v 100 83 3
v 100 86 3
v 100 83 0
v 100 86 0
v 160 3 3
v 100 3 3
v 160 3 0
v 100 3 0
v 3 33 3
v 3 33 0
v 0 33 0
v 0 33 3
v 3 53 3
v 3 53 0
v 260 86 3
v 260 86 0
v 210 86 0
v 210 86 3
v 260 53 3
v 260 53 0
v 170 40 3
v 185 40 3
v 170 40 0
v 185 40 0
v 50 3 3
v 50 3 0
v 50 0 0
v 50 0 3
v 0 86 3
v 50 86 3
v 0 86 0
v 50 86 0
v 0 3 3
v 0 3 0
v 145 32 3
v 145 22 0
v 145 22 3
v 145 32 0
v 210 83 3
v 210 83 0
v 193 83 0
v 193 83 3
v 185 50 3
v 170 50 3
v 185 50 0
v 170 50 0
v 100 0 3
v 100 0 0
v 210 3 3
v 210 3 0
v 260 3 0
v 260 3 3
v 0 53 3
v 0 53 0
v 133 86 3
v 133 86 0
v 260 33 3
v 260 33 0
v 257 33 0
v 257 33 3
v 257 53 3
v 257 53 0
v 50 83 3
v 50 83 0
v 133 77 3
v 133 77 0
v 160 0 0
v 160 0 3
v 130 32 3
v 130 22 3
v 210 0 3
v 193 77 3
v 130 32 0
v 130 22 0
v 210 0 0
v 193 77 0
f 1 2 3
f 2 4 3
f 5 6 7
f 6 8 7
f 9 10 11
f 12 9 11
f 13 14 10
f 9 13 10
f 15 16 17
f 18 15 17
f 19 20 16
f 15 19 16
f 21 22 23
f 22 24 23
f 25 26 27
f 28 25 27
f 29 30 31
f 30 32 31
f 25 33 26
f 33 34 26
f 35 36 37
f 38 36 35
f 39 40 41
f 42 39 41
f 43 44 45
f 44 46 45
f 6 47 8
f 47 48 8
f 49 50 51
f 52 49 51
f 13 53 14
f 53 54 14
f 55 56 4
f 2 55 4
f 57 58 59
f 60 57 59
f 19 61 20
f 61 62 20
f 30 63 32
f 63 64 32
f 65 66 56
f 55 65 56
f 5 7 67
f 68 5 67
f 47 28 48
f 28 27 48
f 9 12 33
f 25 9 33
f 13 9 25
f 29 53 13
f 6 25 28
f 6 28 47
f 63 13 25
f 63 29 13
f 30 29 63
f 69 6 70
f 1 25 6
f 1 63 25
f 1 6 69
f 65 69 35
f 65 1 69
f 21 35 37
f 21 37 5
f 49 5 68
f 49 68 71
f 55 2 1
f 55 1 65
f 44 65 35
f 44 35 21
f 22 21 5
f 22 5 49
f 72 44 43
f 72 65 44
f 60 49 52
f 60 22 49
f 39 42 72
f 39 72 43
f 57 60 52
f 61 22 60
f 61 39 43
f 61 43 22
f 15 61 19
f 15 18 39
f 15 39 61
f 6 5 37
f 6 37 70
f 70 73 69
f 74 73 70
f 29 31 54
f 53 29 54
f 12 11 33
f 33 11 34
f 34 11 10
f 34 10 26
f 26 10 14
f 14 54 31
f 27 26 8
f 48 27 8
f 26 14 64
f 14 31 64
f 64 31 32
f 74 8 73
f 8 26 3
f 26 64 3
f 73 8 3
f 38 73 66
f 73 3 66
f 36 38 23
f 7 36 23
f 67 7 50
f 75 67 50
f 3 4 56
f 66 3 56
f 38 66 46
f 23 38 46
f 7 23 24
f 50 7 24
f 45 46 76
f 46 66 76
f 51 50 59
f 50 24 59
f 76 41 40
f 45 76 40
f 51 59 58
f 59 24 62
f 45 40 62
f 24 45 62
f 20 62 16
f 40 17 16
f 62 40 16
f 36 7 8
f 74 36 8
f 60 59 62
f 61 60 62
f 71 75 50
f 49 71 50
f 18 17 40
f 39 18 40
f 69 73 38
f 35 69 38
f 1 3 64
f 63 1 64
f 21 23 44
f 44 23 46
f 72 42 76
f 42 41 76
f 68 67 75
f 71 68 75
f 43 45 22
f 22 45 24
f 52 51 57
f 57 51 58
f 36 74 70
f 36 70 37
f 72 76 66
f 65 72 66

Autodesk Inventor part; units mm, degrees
ref_plane "YZ Plane" through (0, 0, 0) normal (1, 0, 0) x (0, 1, 0)
ref_plane "XZ Plane" through (0, 0, 0) normal (0, 1, 0) x (-1, 0, 0)
ref_plane "XY Plane" through (0, 0, 0) normal (0, 0, 1) x (1, 0, 0)
sketch "Sketch1" plane through (0, 0, 0) normal (0, 0, 1) x (1, 0, 0)
  line L0 (0, 0) -> (0, 3) construction
  line L1 (0, 3) -> (50, 3)
  line L2 (50, 3) -> (50, 0)
  line L3 (50, 0) -> (100, 0)
  line L4 (100, 0) -> (100, 3)
  line L5 (100, 3) -> (160, 3)
  line L6 (160, 3) -> (160, 0)
  line L7 (160, 0) -> (210, 0)
  line L8 (210, 0) -> (210, 3)
  line L9 (210, 3) -> (260, 3)
  line L10 (260, 3) -> (260, 33)
  line L11 (260, 33) -> (257, 33)
  line L12 (257, 33) -> (257, 53)
  line L13 (257, 53) -> (260, 53)
  line L14 (260, 53) -> (260, 86)
  line L15 (0, 86) -> (0, 53)
  line L16 (0, 53) -> (3, 53)
  line L17 (3, 53) -> (3, 33)
  line L18 (3, 33) -> (0, 33)
  line L19 (0, 33) -> (0, 3)
  line L20 (260, 0) -> (260, 25) construction
  line L21 (260, 25) -> (260, 28) construction
  line L22 (135, 28) -> (135, 0) construction
  line L23 (135, 0) -> (135, 20) construction
  line L24 (130, 28) -> (130, 0) construction
  line L25 (130, 0) -> (130, 25) construction
  line L26 (260, 0) -> (260, 22) construction
  line L27 (260, 22) -> (260, 32) construction
  line L28 (260, 32) -> (145, 32) construction
  line L29 (145, 32) -> (130, 32) construction
  line L30 (130, 32) -> (130, 22)
  line L31 (145, 22) -> (145, 32)
  line L32 (130, 32) -> (145, 32)
  line L33 (130, 22) -> (145, 22)
  line L34 (260, 86) -> (210, 86)
  line L35 (210, 86) -> (210, 83)
  line L36 (100, 86) -> (100, 83)
  line L37 (100, 83) -> (50, 83)
  line L38 (50, 83) -> (50, 86)
  line L39 (50, 86) -> (0, 86)
  line L40 (260, 83) -> (193, 83) construction
  line L41 (193, 83) -> (193, 77)
  line L42 (193, 77) -> (133, 77)
  line L43 (133, 77) -> (133, 86)
  line L44 (210, 83) -> (193, 83)
  line L45 (133, 86) -> (100, 86)
  line L46 (145, 32) -> (170, 32) construction
  line L47 (170, 32) -> (170, 0) construction
  line L48 (170, 0) -> (170, 40) construction
  line L49 (170, 40) -> (170, 50)
  line L50 (170, 50) -> (185, 50)
  line L51 (185, 50) -> (185, 40)
  line L52 (185, 40) -> (170, 40)
  point P0 (0, 18)
  dimension "d0" = 3
  dimension "d2" = 50
  dimension "d3" = 60
  dimension "d4" = 50
  dimension "d5" = 50
  dimension "d6" = 30
  dimension "d7" = 3
  dimension "d8" = 20
  dimension "d9" = 33
  dimension "d10" = 33
  dimension "d11" = 3
  dimension "d12" = 20
  dimension "d24" = 20
  dimension "d29" = 25
  dimension "d32" = 22
  dimension "d33" = 10
  dimension "d34" = 115
  dimension "d35" = 15
  dimension "d37" = 3
  dimension "d40" = 50
  dimension "d41" = 50
  dimension "d42" = 67
  dimension "d43" = 6
  dimension "d44" = 60
  dimension "d45" = 25
  dimension "d46" = 40
  dimension "d47" = 10
  dimension "d48" = 15
extrude "Extrusion1" add sketch "Sketch1" along normal blind 3
properties part number "Belakang"
